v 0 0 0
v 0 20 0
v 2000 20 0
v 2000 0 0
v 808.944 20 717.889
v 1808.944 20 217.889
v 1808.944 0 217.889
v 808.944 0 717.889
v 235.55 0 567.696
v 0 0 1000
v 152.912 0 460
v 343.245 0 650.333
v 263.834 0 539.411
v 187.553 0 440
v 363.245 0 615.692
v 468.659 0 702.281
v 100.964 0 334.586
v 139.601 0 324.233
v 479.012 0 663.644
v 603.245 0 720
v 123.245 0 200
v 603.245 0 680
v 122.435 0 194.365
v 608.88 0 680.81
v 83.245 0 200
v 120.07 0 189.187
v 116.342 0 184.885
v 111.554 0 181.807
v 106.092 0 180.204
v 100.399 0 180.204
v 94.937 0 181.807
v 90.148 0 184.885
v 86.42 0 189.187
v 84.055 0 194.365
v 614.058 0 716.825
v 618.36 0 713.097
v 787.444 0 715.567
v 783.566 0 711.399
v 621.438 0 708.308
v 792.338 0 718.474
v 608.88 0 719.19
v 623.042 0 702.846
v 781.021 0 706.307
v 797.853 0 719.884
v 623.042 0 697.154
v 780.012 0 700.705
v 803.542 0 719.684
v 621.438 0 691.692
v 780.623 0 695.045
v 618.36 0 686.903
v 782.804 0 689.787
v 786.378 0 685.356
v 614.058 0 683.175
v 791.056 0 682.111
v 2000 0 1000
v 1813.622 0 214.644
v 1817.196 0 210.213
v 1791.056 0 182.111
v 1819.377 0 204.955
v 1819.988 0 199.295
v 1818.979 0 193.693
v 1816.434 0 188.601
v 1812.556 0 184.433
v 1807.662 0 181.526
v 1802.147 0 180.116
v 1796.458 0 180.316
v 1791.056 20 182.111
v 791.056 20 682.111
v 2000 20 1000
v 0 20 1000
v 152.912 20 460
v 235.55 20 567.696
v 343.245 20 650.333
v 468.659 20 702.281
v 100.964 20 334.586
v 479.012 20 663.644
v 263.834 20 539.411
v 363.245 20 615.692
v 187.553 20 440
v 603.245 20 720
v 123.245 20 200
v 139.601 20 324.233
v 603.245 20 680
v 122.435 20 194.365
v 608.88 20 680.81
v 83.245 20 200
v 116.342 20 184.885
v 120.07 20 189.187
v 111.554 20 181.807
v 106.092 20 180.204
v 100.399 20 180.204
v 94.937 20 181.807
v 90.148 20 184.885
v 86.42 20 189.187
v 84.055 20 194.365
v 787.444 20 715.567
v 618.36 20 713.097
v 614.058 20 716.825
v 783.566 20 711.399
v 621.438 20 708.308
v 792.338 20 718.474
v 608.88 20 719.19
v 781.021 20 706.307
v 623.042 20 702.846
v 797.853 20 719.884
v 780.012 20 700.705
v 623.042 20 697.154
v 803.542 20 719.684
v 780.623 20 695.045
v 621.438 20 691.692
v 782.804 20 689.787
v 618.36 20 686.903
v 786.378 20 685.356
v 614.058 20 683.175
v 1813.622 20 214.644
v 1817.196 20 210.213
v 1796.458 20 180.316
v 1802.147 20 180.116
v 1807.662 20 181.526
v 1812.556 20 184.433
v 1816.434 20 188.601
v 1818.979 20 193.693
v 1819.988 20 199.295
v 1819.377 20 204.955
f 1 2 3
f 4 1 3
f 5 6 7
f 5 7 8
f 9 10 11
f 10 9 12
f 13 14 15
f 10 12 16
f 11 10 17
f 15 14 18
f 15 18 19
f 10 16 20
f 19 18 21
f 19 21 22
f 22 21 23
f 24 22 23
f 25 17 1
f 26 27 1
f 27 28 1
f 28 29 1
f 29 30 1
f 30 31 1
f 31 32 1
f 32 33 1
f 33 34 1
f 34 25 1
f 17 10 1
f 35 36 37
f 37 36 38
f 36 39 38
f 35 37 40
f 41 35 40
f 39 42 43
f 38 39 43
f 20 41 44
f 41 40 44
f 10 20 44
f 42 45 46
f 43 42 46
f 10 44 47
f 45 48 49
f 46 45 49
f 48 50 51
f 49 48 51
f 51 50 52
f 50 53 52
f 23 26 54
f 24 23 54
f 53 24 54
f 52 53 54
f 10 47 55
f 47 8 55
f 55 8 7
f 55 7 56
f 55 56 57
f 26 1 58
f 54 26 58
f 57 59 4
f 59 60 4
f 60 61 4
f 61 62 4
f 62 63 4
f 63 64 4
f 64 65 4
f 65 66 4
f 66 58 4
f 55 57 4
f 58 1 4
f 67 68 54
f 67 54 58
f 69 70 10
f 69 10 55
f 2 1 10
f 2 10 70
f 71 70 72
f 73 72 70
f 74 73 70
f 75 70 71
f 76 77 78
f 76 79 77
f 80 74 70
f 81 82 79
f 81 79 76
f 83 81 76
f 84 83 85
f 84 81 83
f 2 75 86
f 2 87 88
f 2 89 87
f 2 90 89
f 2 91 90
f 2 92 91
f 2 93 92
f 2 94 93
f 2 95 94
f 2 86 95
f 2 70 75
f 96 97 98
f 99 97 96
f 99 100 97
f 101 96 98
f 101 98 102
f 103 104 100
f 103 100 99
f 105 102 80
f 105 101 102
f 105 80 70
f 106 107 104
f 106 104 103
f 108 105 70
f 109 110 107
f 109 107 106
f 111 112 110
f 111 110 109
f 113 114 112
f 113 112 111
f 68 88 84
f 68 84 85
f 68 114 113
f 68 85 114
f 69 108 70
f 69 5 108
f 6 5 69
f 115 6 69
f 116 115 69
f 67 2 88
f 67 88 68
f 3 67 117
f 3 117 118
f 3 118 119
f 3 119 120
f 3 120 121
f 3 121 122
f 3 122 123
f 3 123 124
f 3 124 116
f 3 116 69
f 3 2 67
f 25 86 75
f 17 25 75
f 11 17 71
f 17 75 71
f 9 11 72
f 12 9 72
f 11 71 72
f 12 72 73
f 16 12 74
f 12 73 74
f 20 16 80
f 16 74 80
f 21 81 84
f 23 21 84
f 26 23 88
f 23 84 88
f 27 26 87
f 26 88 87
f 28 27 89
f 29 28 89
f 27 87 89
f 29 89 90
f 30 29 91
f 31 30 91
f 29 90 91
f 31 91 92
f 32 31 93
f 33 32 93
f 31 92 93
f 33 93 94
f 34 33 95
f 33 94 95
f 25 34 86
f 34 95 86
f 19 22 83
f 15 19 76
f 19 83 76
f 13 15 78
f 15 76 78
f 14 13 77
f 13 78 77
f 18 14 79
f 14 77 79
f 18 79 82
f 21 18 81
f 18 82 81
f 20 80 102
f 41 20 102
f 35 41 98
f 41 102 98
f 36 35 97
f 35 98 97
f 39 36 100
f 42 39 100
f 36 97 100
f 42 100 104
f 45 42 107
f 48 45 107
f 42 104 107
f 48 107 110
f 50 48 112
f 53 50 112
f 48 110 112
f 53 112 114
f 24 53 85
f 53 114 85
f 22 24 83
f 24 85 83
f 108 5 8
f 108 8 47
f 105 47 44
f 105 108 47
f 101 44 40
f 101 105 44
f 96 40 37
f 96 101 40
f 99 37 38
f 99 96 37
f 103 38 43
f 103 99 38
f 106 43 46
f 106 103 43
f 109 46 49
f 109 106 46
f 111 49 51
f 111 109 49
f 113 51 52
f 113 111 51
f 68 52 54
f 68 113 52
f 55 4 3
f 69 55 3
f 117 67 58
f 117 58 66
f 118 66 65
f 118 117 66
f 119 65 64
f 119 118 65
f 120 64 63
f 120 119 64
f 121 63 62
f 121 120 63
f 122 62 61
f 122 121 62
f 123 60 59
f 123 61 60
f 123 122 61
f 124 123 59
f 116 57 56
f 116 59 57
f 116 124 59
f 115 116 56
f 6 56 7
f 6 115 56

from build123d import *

# Parameters (mm, degrees)
ESQUISSE1_W             = 2000
ESQUISSE1_H             = 20
BOSS_EXTRU_1_DEPTH      = 1000
ENL_V_MAT_EXTRU_1_DEPTH = 2237.15741843


with BuildPart() as part:
    # Esquisse1 → Boss.-Extru.1 (new body)
    with BuildSketch(Plane.XY):
        with Locations((1000, 10)):
            Rectangle(ESQUISSE1_W, ESQUISSE1_H)
    extrude(amount=BOSS_EXTRU_1_DEPTH)

    # Esquisse2 → Enlèv. mat.-Extru.1 (cut, through all)
    with BuildSketch(Plane(origin=(0, 20, 0), x_dir=(1, 0, 0), z_dir=(0, 1, 0))):
        with BuildLine():
            Line((1808.94427191, -217.88854382), (808.94427191, -717.88854382))
            ThreePointArc((808.94427191, -717.88854382), (782.11145618, -708.94427191), (791.05572809, -682.11145618))
            Line((791.05572809, -682.11145618), (1791.05572809, -182.11145618))
            ThreePointArc((1791.05572809, -182.11145618), (1817.88854382, -191.05572809), (1808.94427191, -217.88854382))
        make_face()
        with BuildLine():
            ThreePointArc((83.245255668, -200), (235.549729451, -567.695526217), (603.245255668, -720))
            ThreePointArc((603.245255668, -720), (623.245255668, -700), (603.245255668, -680))
            ThreePointArc((603.245255668, -680), (263.834000698, -539.41125497), (123.245255668, -200))
            ThreePointArc((123.245255668, -200), (103.245255668, -180), (83.245255668, -200))
        make_face()
    extrude(amount=-ENL_V_MAT_EXTRU_1_DEPTH, mode=Mode.SUBTRACT)


solid = part.part
